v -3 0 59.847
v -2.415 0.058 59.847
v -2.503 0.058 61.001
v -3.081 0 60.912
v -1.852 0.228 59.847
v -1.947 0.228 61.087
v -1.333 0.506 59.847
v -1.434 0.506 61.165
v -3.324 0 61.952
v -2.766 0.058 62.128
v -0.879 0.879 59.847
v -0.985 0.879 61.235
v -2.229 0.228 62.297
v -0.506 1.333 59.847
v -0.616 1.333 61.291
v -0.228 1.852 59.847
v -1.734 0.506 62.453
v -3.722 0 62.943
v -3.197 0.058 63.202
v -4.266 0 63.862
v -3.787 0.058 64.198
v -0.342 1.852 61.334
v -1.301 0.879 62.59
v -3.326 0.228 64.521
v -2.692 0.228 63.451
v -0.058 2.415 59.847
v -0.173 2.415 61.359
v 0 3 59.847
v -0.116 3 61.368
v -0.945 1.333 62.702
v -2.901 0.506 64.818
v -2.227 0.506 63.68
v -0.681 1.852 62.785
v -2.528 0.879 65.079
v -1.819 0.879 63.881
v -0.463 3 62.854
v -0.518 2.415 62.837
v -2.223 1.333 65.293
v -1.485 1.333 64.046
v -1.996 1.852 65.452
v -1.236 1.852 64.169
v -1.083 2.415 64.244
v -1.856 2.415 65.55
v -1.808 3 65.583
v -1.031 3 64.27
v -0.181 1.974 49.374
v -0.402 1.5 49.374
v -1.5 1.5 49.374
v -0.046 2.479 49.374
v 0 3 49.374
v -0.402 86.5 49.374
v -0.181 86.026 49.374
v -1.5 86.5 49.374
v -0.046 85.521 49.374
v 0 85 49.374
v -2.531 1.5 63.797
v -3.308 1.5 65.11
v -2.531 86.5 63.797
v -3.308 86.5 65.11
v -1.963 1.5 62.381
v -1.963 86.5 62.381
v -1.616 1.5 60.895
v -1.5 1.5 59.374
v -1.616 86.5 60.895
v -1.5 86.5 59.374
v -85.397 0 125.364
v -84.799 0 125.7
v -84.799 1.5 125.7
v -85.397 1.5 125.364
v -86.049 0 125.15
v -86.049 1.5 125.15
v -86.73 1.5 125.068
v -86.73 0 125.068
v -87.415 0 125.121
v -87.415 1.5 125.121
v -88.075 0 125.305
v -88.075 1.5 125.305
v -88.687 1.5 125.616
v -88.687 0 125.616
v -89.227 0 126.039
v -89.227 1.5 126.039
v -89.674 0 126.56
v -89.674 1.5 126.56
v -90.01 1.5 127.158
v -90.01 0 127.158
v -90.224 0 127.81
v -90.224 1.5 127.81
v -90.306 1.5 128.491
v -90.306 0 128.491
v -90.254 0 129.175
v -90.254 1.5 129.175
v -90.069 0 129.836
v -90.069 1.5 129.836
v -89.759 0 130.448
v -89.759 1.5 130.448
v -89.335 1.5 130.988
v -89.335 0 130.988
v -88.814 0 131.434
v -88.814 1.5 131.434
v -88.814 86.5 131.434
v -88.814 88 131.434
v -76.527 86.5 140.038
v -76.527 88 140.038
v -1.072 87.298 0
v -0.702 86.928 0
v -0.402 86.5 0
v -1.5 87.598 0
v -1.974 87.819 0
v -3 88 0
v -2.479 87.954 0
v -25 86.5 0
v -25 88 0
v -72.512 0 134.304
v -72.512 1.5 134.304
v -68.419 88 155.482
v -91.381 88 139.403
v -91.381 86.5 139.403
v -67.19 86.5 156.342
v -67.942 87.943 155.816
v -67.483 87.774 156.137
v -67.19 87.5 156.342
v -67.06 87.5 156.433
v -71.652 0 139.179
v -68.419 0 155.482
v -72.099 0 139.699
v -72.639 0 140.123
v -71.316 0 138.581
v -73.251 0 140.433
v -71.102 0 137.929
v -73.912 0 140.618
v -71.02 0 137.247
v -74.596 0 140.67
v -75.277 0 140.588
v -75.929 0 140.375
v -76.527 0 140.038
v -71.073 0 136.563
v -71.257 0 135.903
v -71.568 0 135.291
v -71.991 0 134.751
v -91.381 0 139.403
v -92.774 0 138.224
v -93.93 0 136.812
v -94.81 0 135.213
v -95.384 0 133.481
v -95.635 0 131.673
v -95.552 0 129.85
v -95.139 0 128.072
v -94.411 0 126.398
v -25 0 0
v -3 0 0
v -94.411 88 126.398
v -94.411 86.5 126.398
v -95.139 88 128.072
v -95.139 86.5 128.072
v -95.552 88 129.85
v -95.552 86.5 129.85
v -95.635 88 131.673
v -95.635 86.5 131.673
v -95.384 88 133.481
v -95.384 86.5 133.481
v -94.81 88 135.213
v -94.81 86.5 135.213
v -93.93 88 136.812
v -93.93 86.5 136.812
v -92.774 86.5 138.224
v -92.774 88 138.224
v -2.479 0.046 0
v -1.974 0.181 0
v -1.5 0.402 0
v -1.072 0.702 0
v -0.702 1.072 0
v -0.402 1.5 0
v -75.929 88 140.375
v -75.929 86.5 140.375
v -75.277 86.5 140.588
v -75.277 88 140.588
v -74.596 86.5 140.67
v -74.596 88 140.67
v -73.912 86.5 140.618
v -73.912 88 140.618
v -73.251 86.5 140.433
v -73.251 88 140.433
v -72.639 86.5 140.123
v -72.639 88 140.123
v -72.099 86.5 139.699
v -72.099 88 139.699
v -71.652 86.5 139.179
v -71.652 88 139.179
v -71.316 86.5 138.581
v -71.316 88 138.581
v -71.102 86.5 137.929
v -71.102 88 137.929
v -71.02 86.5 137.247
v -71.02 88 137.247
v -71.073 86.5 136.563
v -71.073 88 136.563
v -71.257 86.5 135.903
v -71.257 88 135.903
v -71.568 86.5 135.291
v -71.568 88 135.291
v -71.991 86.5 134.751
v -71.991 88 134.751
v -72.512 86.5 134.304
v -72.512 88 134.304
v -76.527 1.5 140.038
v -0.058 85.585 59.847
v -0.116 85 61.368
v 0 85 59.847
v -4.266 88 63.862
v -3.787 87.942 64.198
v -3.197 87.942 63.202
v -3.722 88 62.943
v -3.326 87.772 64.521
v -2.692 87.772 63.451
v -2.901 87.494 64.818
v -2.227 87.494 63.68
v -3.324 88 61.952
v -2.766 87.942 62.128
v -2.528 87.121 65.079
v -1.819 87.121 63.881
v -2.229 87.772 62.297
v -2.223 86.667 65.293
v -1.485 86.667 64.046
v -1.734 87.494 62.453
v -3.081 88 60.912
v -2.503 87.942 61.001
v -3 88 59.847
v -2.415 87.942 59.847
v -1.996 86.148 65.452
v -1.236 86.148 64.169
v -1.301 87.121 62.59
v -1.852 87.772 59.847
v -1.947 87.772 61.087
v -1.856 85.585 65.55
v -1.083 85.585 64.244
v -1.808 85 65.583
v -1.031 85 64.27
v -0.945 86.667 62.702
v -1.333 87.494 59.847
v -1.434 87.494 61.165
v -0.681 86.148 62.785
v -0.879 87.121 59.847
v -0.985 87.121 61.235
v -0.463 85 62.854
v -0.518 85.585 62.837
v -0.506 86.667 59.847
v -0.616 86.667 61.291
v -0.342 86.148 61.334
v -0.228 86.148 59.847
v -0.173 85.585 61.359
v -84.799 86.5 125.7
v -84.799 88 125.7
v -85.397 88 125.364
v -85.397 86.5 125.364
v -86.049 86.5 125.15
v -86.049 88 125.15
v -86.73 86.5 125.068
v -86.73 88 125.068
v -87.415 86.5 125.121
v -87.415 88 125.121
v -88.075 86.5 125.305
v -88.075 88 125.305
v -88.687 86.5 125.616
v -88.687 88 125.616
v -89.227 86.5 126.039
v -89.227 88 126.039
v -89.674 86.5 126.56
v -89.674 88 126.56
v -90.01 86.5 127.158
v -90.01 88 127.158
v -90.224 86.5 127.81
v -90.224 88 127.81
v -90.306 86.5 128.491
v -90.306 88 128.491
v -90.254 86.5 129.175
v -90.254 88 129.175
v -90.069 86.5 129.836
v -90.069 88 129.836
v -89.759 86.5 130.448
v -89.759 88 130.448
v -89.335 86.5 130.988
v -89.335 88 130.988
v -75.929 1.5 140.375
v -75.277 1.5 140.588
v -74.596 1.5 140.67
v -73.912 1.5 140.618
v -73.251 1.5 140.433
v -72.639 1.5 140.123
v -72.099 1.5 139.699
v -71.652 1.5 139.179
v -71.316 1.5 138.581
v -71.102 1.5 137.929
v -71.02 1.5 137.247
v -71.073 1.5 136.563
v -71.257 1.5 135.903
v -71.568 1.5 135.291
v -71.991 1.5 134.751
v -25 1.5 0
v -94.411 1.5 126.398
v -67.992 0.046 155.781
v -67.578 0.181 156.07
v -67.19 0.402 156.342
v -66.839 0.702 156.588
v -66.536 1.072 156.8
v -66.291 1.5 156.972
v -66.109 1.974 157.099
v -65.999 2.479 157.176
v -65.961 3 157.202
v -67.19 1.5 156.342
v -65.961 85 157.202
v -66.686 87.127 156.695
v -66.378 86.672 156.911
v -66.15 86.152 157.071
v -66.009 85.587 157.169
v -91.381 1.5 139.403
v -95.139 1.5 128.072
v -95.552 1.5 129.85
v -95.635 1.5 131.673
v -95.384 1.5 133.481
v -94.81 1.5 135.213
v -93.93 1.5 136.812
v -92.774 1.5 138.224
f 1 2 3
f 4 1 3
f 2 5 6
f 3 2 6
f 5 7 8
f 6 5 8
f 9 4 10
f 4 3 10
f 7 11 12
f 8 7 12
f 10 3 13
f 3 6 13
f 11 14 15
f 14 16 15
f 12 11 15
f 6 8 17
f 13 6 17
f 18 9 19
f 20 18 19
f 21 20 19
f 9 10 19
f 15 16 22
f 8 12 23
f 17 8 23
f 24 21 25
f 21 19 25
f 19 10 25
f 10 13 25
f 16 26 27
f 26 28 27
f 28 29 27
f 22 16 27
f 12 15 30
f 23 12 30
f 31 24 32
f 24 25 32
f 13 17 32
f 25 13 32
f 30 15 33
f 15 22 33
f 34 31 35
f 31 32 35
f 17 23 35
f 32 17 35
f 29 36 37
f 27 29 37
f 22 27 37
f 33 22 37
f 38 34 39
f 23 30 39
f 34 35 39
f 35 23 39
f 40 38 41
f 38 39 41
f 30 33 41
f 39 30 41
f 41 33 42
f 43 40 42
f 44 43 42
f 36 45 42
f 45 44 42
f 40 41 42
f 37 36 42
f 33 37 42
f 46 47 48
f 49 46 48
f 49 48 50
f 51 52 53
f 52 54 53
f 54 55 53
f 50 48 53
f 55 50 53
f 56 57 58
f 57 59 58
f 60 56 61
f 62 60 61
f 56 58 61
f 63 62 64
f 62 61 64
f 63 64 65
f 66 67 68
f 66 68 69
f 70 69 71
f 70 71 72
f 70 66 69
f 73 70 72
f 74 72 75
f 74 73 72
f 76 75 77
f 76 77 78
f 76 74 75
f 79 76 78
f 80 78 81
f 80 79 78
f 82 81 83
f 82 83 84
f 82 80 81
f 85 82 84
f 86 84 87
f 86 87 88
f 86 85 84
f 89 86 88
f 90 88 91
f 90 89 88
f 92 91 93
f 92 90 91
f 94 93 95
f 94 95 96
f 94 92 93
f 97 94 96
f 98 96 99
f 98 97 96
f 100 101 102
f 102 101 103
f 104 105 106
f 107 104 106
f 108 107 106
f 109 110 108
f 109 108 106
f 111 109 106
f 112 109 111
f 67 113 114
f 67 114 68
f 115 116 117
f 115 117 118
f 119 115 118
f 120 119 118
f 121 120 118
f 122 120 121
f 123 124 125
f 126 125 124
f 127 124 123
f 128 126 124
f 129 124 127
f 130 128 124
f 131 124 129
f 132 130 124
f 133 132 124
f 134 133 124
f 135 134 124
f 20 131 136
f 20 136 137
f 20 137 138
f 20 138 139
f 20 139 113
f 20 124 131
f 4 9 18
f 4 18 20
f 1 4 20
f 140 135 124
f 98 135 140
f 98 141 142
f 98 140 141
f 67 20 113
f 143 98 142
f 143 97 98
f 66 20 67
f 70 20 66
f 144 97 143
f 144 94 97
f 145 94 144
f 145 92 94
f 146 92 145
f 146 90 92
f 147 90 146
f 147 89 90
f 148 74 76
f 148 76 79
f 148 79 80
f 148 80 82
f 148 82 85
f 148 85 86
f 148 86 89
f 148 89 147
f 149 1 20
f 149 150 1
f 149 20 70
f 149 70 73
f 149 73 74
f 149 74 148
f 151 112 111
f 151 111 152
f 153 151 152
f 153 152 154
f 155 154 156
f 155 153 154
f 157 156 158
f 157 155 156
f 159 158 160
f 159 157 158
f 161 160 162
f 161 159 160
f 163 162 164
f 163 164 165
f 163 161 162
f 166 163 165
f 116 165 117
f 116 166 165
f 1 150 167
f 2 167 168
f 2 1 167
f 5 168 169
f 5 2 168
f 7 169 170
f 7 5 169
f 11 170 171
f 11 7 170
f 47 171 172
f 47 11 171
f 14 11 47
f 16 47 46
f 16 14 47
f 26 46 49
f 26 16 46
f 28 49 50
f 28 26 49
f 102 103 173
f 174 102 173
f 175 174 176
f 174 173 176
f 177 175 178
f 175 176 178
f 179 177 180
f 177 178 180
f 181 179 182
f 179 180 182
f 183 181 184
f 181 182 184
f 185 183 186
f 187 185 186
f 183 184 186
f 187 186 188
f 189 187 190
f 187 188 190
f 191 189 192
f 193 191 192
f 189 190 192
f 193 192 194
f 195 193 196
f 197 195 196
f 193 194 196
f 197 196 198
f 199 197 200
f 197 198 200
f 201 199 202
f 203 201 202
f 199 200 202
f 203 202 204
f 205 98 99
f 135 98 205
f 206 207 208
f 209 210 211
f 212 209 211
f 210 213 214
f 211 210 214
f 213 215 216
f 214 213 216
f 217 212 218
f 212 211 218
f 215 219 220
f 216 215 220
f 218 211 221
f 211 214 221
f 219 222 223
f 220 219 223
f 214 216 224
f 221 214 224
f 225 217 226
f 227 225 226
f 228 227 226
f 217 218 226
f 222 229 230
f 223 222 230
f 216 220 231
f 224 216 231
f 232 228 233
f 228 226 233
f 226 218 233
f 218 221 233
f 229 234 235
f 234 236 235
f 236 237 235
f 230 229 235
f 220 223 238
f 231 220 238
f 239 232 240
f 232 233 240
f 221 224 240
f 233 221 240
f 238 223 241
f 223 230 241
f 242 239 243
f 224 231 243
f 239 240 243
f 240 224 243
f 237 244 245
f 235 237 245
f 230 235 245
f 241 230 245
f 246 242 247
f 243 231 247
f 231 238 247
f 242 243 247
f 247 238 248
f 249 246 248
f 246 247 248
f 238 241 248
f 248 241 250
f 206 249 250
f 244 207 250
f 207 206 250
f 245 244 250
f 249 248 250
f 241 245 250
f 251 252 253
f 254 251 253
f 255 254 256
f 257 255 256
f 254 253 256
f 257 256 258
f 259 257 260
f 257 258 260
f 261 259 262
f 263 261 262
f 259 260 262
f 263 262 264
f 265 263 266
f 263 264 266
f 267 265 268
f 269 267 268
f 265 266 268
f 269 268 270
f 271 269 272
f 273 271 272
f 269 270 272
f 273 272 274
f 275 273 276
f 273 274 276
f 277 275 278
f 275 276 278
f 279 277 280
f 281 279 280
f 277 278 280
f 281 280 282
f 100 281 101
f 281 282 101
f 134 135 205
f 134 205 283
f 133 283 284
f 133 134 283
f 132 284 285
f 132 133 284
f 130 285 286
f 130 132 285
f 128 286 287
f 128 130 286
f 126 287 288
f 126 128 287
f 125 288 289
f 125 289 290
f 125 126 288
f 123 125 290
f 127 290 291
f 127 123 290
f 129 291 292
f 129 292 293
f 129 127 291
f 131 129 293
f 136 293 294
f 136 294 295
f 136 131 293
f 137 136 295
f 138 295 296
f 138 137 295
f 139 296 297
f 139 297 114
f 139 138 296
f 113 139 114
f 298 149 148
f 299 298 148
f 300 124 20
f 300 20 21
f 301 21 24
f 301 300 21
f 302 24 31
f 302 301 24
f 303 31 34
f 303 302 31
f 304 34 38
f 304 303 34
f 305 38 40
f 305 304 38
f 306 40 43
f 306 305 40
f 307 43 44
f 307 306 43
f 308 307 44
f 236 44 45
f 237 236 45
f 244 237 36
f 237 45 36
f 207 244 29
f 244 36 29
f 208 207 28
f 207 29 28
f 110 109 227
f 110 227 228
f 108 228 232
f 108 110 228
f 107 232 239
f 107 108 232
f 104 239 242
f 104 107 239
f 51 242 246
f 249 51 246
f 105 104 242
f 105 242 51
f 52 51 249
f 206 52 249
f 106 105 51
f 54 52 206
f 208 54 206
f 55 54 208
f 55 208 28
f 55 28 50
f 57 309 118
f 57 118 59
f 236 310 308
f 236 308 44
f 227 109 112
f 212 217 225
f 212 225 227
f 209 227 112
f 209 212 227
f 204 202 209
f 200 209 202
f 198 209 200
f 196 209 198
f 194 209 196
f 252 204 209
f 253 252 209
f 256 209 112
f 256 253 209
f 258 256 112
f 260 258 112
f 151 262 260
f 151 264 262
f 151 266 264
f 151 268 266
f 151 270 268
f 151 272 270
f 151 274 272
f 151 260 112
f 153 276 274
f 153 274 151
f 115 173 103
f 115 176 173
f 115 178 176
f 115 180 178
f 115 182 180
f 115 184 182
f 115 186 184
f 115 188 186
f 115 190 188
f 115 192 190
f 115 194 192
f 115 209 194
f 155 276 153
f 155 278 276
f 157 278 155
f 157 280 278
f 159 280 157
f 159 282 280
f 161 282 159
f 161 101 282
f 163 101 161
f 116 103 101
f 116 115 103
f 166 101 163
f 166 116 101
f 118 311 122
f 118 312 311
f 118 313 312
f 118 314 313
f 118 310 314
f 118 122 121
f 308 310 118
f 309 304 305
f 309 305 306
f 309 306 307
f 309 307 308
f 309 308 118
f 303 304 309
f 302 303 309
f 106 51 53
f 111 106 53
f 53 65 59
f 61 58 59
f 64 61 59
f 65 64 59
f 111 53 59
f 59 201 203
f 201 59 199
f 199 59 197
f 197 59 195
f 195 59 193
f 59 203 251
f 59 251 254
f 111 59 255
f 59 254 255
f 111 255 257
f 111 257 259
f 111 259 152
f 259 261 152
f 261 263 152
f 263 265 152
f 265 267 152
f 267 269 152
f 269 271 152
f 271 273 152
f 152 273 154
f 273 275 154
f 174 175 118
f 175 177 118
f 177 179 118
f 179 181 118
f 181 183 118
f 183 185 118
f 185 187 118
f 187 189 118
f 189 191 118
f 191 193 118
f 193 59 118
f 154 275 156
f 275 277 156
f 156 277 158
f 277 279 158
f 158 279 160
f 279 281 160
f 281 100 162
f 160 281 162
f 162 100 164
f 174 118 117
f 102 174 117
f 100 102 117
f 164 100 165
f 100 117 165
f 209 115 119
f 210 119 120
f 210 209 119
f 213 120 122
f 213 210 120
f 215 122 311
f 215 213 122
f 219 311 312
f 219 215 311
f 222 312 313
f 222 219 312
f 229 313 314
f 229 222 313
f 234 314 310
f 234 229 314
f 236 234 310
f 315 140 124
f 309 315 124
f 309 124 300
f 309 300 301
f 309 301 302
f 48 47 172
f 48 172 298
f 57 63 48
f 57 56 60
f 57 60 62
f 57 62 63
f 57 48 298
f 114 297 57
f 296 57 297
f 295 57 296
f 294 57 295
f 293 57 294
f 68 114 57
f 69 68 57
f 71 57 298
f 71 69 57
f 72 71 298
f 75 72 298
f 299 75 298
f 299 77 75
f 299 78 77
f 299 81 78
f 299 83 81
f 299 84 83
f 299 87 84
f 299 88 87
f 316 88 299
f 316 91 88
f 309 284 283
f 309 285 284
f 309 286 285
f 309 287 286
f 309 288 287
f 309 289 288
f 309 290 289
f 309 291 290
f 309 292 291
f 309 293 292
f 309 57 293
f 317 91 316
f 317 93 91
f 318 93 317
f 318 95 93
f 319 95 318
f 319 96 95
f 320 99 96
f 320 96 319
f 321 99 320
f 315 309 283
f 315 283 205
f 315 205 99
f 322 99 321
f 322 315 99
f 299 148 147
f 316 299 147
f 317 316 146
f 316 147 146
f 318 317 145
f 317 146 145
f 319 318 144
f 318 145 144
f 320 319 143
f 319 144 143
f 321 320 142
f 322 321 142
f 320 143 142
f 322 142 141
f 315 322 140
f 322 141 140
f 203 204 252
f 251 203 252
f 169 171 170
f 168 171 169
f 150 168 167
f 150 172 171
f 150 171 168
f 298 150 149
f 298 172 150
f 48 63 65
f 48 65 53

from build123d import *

# Parameters (mm, degrees)
BOSS_EXTRUDE1_DEPTH = 87.5
BOSS_EXTRUDE2_DEPTH = 1.5
FILLET1_R           = 10
FILLET2_R           = 3
CUT_EXTRUDE1_REACH  = 205.273
SKETCH3_W           = 49.374063928
SKETCH3_H           = 85


with BuildPart() as part:
    # Sketch1 → Boss-Extrude1 (new body)
    with BuildSketch(Plane(origin=(0, 0, 0), x_dir=(1, 0, 0), z_dir=(0, 1, 0))):
        Polygon((0, 0), (0, -63), (-65.96129018, -157.202485093), (-67.190018247, -156.342120439), (-1.5, -62.527051817), (-1.5, 0), align=None)
    extrude(amount=BOSS_EXTRUDE1_DEPTH)

    # Sketch2 → Boss-Extrude2 (add)
    with BuildSketch(Plane.XZ):
        with BuildLine():
            Line((0, 0), (-25, 0))
            Line((-25, 0), (-94.410596168, 126.398468668))
            ThreePointArc((-94.410596168, 126.398468668), (-95.384485345, 133.480683165), (-91.38102437, 139.403395594))
            Line((-91.38102437, 139.403395594), (-65.96129018, 157.202485093))
            Line((-65.96129018, 157.202485093), (0, 63))
            Line((0, 63), (0, 0))
        make_face()
        with BuildLine():
            Line((-72.511956454, 134.304040356), (-84.799237119, 125.700393811))
            ThreePointArc((-84.799237119, 125.700393811), (-89.673786801, 126.559908439), (-88.814272173, 131.434458121))
            Line((-88.814272173, 131.434458121), (-76.526991509, 140.038104666))
            ThreePointArc((-76.526991509, 140.038104666), (-71.652441827, 139.178590039), (-72.511956454, 134.304040356))
        make_face(mode=Mode.SUBTRACT)
    boss_extrude2 = extrude(amount=-BOSS_EXTRUDE2_DEPTH)

    # Mirror1: Boss-Extrude2 across plane
    add(boss_extrude2.mirror(Plane.ZX.offset(44)))

    # Fillet1
    fillet1_edges = [part.edges().sort_by_distance(p)[0] for p in [
        (0, 44, 63),
        (-1.5, 44, 62.527051817),
    ]]
    fillet(fillet1_edges, radius=FILLET1_R)

    # Fillet2
    fillet2_edges = [part.edges().sort_by_distance(p)[0] for p in [
        (0, 88, 29.923506056),
        (-33.884884869, 0, 111.392630784),
        (0, 0, 29.923506056),
        (-0.462830493, 0, 62.854070106),
        (-33.884884869, 88, 111.392630784),
        (-0.462830493, 88, 62.854070106),
    ]]
    fillet(fillet2_edges, radius=FILLET2_R)

    # Cut-Extrude1: up to this face of the body (flat: up to its plane)
    cut_extrude1_end = Plane(part.part.faces().sort_by_distance((0, 44, 29.923506056))[0])
    # Sketch3 → Cut-Extrude1 (cut, up to the picked face)
    with BuildSketch(Plane.ZY.offset(1.5), mode=Mode.PRIVATE) as cut_extrude1_sk1:
        with Locations((24.687031964, 44)):
            Rectangle(SKETCH3_W, SKETCH3_H)
    cut_extrude1_tool1 = split(extrude(cut_extrude1_sk1.sketch, amount=-CUT_EXTRUDE1_REACH, mode=Mode.PRIVATE), bisect_by=cut_extrude1_end, keep=Keep.BOTH, mode=Mode.PRIVATE)
    add(cut_extrude1_tool1.solids().sort_by(Axis((-1.5, 44, 24.687032), (1, 0, 0)))[0], mode=Mode.SUBTRACT)


solid = part.part
